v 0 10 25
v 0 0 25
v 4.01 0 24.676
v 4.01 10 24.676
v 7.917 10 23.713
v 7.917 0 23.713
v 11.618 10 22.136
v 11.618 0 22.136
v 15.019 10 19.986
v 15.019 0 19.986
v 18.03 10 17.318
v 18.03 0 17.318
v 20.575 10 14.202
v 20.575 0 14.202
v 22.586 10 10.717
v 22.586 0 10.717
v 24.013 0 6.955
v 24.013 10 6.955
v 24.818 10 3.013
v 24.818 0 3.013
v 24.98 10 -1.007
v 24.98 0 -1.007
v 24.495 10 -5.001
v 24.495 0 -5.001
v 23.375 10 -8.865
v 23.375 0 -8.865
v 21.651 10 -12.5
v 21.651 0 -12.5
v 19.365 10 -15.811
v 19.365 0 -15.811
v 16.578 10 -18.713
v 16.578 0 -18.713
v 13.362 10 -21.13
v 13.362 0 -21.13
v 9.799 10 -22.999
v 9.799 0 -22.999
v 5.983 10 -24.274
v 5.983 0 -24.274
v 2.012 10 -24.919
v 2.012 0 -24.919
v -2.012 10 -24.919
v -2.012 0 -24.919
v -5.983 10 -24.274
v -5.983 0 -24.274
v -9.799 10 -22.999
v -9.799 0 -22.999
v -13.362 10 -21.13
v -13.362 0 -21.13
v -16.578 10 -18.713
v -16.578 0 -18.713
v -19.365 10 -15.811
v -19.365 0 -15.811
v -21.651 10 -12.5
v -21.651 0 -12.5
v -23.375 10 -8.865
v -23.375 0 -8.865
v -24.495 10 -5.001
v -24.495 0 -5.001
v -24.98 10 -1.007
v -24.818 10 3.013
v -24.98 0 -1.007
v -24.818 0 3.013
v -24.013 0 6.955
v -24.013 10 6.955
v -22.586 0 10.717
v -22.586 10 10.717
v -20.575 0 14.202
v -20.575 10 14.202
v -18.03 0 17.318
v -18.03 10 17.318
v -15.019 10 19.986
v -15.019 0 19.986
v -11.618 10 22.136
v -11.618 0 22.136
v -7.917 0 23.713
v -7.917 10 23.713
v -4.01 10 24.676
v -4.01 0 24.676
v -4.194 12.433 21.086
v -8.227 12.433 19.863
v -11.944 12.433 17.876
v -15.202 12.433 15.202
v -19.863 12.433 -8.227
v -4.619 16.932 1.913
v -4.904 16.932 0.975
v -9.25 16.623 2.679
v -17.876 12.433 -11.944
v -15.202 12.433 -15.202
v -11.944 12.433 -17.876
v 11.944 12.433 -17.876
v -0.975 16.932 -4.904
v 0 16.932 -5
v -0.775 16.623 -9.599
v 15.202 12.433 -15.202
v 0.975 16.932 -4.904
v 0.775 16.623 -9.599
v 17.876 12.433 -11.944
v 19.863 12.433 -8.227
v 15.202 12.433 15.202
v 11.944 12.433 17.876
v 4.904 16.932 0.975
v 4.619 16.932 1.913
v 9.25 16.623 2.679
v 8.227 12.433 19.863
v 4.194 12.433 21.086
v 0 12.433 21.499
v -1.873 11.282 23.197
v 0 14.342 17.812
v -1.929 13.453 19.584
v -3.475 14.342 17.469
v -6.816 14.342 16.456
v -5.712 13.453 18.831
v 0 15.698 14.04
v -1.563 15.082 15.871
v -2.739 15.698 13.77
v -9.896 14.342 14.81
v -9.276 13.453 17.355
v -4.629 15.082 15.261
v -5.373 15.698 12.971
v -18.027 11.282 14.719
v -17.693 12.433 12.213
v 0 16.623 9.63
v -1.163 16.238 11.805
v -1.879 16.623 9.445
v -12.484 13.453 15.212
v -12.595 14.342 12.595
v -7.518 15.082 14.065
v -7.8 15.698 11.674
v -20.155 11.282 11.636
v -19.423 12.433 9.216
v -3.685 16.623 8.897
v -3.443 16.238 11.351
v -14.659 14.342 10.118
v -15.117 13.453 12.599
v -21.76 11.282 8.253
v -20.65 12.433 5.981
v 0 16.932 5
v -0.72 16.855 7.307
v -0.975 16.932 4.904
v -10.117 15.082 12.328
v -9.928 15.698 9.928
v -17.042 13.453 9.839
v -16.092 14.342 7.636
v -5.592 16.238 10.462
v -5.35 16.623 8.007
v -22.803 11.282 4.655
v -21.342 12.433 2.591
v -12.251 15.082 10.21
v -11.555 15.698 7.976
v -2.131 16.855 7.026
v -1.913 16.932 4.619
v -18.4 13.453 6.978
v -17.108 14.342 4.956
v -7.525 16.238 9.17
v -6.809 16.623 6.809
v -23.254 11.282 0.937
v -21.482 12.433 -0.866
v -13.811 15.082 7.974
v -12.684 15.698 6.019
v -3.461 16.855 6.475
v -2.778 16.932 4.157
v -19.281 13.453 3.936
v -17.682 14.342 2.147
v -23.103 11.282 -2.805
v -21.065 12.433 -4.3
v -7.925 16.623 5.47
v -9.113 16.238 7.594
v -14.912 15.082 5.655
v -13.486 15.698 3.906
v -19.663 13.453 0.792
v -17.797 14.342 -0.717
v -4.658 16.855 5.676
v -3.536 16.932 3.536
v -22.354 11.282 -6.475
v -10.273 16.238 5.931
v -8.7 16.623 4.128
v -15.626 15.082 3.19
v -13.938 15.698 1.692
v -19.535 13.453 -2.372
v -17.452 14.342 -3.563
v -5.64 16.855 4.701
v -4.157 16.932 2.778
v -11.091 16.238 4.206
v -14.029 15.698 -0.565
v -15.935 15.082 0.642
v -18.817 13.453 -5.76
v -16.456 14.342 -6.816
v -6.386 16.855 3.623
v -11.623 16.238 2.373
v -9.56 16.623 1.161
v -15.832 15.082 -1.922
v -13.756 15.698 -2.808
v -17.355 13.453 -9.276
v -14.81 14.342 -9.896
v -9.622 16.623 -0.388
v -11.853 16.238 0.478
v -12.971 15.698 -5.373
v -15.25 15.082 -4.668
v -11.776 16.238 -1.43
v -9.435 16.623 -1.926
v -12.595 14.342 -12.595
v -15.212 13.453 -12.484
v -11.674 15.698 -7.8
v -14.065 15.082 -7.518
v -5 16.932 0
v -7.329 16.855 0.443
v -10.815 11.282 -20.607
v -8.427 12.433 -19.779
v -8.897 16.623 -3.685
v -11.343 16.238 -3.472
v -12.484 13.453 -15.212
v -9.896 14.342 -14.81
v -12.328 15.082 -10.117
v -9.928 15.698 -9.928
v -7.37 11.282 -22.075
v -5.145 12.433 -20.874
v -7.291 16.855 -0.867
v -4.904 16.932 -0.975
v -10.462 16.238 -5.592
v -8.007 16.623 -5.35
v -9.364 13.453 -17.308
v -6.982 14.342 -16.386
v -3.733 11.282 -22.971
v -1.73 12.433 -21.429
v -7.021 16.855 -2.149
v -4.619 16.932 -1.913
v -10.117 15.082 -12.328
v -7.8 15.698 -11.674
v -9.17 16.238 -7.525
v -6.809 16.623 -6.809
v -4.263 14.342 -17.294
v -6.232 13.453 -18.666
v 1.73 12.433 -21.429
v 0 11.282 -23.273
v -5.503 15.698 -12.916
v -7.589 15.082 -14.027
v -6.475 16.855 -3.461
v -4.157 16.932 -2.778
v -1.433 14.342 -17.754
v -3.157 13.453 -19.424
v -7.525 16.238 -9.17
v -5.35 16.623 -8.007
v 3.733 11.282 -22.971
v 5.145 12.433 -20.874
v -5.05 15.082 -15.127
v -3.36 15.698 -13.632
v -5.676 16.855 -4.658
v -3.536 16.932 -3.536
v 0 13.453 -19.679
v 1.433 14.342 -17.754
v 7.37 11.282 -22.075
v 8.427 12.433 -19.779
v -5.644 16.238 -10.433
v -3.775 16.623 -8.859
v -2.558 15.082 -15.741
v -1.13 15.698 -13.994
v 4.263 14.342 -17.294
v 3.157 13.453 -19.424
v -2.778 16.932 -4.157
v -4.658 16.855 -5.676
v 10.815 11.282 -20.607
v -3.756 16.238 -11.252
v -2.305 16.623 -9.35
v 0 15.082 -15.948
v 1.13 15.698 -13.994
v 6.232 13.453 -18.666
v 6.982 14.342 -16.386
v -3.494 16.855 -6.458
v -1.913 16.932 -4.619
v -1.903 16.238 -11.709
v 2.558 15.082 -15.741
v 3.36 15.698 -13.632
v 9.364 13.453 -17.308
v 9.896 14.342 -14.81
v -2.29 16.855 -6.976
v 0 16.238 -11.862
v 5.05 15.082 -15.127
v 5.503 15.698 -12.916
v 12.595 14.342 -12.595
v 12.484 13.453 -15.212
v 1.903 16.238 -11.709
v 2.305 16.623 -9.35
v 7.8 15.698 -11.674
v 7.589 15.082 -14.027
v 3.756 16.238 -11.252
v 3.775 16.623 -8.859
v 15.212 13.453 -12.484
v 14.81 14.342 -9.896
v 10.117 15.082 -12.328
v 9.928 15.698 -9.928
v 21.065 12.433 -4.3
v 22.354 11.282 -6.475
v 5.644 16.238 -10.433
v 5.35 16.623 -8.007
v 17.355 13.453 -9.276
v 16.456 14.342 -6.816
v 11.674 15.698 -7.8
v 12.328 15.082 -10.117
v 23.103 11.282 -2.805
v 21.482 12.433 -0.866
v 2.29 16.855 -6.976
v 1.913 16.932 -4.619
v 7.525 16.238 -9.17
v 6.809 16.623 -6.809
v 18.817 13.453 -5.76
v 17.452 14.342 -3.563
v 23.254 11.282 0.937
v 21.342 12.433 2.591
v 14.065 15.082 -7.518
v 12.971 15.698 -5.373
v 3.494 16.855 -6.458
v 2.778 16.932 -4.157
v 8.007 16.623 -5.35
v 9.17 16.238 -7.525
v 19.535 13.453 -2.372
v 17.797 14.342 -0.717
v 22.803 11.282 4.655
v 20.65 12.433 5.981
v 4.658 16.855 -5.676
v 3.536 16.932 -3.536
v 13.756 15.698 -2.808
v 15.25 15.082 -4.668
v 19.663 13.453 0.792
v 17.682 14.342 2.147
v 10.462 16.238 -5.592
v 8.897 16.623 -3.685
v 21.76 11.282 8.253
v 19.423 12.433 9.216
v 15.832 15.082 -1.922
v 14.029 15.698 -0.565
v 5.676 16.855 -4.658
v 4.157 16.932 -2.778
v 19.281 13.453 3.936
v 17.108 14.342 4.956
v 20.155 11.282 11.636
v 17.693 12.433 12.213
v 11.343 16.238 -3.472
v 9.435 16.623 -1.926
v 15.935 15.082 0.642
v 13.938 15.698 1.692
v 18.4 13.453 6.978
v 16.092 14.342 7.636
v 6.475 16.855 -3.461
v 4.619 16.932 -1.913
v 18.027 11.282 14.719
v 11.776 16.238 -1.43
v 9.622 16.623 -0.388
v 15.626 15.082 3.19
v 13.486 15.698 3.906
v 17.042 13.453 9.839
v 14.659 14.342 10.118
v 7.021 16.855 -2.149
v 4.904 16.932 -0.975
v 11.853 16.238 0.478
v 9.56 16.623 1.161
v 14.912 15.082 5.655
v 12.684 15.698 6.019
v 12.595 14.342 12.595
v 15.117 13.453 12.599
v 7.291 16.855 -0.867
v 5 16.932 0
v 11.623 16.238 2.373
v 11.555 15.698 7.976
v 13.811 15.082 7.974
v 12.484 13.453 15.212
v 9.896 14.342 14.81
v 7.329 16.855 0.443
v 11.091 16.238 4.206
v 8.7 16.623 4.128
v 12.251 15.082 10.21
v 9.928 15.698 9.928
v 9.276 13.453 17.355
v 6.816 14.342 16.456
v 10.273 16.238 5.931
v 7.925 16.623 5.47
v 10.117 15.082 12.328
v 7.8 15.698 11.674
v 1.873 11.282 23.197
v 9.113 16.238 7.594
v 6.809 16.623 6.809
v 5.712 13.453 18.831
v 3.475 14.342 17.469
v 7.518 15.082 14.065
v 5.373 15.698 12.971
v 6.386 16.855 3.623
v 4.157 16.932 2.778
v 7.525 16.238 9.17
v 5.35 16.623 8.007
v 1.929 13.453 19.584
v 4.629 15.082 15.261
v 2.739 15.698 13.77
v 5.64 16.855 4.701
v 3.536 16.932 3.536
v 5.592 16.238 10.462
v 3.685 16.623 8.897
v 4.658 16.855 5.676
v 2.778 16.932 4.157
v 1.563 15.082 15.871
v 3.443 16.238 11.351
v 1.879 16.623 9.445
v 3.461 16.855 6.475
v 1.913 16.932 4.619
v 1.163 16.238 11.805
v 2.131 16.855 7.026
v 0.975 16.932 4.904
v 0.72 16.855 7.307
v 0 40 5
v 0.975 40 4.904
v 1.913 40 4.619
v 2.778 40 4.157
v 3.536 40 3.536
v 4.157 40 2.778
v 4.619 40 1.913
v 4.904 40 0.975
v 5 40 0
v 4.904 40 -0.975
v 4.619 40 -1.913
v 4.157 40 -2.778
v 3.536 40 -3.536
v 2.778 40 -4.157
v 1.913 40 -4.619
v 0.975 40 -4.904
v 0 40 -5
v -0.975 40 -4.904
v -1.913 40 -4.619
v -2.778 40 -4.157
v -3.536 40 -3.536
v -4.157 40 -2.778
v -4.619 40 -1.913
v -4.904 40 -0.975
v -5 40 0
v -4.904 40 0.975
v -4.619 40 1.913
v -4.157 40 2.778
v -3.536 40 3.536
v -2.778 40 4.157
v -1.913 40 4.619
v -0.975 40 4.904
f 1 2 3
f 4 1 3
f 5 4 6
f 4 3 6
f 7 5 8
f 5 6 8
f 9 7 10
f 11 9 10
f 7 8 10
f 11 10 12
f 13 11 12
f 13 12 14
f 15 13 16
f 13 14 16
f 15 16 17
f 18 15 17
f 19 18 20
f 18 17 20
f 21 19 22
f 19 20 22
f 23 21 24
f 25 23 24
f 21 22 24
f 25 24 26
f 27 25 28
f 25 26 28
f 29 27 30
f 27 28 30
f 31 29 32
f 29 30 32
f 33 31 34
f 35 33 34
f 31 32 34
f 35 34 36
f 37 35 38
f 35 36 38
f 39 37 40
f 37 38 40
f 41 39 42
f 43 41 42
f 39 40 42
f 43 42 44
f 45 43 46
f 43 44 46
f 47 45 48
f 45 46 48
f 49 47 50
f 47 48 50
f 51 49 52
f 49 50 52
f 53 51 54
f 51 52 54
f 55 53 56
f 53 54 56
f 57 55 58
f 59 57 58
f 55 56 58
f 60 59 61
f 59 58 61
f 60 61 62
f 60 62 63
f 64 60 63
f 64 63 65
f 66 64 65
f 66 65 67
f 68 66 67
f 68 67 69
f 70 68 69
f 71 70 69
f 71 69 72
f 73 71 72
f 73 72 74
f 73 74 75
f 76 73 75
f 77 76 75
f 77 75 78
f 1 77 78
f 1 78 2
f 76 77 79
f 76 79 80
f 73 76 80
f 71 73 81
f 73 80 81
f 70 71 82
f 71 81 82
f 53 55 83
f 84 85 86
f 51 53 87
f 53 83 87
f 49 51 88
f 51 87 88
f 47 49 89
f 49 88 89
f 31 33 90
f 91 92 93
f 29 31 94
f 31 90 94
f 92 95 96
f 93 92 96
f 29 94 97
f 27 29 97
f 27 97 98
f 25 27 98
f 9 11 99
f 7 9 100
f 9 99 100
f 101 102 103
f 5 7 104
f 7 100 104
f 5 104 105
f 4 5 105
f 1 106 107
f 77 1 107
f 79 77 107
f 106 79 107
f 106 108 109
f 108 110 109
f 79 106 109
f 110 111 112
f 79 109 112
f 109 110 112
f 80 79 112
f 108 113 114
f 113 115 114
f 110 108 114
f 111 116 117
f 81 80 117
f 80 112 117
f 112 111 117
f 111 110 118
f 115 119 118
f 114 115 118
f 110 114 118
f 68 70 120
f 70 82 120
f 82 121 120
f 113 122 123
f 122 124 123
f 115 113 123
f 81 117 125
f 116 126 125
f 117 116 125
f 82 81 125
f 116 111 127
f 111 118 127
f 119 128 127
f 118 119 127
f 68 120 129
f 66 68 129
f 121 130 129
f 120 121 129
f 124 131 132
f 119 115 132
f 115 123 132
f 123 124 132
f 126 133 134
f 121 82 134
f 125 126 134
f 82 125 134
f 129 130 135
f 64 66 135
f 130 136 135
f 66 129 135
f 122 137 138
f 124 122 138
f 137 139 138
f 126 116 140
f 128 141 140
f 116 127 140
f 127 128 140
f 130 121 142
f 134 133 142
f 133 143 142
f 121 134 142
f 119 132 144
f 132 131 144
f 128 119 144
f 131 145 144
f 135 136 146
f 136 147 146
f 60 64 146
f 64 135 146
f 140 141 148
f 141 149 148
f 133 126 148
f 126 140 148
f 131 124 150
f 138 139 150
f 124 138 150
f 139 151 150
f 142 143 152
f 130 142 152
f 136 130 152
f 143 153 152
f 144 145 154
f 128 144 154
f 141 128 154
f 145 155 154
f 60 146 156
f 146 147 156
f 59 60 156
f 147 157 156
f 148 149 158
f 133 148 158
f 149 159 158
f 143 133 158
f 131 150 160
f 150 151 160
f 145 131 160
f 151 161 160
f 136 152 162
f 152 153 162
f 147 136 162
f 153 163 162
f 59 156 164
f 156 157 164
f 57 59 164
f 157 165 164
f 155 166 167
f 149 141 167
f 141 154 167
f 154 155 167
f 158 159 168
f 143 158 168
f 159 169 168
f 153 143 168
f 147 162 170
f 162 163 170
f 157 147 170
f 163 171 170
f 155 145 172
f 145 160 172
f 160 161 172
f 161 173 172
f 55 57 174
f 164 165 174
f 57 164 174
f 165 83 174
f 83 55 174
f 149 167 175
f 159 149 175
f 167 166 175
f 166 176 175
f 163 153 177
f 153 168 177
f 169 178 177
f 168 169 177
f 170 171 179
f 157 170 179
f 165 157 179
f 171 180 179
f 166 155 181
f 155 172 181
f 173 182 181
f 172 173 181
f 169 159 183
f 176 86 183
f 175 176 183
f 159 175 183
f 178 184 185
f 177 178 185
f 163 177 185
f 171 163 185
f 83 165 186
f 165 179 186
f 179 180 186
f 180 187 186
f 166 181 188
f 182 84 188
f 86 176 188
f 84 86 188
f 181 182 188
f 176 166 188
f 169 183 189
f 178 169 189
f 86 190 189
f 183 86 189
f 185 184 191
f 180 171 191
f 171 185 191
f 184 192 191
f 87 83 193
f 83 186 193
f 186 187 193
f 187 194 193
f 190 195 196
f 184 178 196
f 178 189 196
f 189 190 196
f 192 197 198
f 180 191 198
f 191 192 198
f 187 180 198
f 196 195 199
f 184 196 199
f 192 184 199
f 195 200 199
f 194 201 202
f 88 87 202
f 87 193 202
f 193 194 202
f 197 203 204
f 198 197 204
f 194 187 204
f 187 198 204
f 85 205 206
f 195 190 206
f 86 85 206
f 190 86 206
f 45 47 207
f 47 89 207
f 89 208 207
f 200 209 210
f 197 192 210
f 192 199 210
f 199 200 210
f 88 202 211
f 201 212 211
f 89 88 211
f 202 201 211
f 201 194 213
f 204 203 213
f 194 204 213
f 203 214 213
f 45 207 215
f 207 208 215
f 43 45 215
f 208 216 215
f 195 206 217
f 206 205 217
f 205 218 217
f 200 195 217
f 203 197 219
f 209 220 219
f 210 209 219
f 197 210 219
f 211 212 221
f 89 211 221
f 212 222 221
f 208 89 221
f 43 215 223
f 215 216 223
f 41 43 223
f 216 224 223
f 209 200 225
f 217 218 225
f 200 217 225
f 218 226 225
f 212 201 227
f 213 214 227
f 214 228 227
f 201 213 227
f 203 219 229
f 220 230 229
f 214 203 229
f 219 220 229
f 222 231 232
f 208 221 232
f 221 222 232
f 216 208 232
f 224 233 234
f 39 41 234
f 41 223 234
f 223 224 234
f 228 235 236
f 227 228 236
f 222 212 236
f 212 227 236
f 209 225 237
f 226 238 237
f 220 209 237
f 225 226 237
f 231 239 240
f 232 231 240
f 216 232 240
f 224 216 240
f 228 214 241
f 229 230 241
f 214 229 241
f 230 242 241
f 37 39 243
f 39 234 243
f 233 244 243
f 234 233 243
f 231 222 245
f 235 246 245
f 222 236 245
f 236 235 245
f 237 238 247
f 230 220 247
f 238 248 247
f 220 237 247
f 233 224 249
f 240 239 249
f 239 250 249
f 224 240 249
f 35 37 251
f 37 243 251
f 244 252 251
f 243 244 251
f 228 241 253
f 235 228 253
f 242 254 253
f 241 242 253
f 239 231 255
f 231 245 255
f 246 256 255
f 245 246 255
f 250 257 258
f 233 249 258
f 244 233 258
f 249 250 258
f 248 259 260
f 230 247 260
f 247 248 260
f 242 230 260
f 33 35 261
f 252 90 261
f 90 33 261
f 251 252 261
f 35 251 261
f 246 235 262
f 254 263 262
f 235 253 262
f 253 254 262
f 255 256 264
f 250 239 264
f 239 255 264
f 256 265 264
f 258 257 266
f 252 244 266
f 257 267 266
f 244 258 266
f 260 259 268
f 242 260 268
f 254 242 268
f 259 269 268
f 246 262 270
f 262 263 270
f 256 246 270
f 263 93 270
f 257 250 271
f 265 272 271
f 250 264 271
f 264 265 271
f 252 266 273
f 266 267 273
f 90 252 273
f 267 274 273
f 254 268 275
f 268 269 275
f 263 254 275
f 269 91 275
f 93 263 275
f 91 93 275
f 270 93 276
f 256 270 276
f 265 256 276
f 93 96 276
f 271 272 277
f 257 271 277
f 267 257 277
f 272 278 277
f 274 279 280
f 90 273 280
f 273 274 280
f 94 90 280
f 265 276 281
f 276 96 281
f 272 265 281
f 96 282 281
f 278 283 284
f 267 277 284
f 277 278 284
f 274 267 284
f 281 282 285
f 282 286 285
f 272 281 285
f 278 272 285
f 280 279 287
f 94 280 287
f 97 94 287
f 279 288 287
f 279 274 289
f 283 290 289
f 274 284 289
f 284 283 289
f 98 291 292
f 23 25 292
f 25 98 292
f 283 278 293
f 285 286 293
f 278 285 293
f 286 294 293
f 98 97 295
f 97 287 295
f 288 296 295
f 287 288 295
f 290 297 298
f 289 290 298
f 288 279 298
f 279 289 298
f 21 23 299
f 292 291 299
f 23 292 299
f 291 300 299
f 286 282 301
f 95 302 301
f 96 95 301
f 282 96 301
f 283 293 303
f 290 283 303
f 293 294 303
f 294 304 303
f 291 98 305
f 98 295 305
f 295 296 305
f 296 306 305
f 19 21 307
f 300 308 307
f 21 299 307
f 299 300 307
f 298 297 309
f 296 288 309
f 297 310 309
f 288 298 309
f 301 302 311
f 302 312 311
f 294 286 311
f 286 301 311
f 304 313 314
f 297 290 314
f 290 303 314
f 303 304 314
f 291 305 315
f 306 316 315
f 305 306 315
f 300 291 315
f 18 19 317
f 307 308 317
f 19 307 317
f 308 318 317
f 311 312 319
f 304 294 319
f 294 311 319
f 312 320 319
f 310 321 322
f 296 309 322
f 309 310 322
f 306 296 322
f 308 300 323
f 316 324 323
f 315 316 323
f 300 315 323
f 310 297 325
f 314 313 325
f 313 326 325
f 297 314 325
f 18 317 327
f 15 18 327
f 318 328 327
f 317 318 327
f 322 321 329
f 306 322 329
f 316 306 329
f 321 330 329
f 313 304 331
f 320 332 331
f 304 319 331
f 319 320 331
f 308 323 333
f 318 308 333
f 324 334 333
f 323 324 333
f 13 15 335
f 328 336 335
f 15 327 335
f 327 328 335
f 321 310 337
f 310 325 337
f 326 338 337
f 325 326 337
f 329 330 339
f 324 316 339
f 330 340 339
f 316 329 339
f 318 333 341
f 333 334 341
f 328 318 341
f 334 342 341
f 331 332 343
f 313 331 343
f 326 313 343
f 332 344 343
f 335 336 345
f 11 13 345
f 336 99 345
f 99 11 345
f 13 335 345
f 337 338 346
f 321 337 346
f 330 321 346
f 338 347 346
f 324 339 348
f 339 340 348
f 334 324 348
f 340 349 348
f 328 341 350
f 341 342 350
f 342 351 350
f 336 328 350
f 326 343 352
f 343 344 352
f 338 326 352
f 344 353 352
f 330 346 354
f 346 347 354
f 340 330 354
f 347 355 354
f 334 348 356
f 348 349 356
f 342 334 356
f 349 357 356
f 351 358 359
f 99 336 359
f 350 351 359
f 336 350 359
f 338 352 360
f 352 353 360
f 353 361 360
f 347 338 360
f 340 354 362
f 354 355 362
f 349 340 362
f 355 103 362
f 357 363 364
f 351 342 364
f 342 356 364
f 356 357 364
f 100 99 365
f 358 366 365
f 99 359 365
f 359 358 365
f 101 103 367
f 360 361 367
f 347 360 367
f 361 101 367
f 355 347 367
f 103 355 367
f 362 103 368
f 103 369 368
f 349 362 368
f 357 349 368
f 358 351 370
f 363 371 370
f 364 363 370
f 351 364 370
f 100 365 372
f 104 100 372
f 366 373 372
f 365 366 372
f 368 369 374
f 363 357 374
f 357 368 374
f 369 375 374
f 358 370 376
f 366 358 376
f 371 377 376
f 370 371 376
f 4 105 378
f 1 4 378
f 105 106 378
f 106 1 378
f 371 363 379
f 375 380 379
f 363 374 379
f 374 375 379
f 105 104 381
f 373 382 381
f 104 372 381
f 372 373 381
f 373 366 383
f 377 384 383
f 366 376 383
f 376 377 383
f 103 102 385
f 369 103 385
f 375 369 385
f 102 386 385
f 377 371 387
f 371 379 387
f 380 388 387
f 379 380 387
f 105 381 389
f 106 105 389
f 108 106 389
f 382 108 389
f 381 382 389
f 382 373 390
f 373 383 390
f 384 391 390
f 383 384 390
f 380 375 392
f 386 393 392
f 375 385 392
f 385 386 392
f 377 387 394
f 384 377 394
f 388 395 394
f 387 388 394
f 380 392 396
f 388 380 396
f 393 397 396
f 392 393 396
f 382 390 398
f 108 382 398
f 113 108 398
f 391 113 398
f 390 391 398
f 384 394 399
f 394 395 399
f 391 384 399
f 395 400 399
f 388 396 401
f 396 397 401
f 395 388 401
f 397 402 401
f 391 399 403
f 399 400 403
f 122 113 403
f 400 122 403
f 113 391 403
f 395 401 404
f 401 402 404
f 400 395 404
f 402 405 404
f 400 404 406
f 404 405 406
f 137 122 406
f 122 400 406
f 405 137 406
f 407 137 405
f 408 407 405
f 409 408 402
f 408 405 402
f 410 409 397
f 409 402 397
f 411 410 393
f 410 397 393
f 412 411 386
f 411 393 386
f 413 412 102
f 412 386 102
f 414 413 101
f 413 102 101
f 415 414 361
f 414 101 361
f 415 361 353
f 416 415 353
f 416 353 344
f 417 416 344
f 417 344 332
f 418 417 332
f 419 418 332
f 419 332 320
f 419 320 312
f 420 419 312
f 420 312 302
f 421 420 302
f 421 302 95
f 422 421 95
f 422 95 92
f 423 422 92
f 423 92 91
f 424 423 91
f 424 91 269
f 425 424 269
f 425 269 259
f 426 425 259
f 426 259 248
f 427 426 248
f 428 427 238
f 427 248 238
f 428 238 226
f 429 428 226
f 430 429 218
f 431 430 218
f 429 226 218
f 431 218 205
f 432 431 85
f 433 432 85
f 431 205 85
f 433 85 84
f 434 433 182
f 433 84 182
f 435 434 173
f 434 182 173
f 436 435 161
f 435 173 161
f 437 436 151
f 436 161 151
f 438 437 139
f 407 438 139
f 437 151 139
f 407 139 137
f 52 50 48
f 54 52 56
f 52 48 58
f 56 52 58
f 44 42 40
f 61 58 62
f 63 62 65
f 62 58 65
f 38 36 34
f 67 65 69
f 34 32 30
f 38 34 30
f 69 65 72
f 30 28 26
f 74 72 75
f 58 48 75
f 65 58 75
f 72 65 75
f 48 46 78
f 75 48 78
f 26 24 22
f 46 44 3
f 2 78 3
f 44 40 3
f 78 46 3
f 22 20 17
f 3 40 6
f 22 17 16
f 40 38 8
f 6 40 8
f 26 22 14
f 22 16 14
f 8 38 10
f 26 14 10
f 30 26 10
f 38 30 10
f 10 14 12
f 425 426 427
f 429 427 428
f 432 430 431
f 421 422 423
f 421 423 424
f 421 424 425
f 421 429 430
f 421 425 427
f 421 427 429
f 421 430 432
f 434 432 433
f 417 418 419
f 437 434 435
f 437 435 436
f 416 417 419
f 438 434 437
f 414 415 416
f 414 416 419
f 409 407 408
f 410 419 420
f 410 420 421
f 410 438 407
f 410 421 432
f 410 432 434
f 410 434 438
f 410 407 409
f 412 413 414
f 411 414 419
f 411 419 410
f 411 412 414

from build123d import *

# Parameters (mm, degrees)
CROQUIS1_R              = 25
SALIENTE_EXTRUIR1_DEPTH = 10
CROQUIS2_R              = 5
SALIENTE_EXTRUIR2_DEPTH = 30


with BuildPart() as part:
    # Croquis1 → Saliente-Extruir1 (new body)
    with BuildSketch(Plane(origin=(0, 0, 0), x_dir=(1, 0, 0), z_dir=(0, 1, 0))):
        with Locations(Location((0, 0, 0), (0, 0, 270))):
            Circle(CROQUIS1_R)
    extrude(amount=SALIENTE_EXTRUIR1_DEPTH)

    # Croquis2 → Saliente-Extruir2 (add)
    with BuildSketch(Plane(origin=(0, 10, 0), x_dir=(1, 0, 0), z_dir=(0, 1, 0))):
        with Locations(Location((0, 0, 0), (0, 0, 270))):
            Circle(CROQUIS2_R)
    extrude(amount=SALIENTE_EXTRUIR2_DEPTH)

    # Croquis4 → Revolución1 (revolve)
    with BuildSketch(Plane.XY, mode=Mode.PRIVATE) as revoluci_n1_sk:
        with BuildLine():
            Line((5, 16.931653532), (5, 10))
            Line((5, 10), (25, 10))
            add(Edge.make_bspline(
                [(25, 10), (16.233689239, 16.931653532), (5, 16.931653532)],
                knots=[0, 0, 0, 1, 1, 1], degree=2))
        make_face()
    revolve(revoluci_n1_sk.sketch.rotate(Axis((0, 40, 0), (0, -1, 0)), 90), axis=Axis((0, 40, 0), (0, -1, 0)))


solid = part.part
